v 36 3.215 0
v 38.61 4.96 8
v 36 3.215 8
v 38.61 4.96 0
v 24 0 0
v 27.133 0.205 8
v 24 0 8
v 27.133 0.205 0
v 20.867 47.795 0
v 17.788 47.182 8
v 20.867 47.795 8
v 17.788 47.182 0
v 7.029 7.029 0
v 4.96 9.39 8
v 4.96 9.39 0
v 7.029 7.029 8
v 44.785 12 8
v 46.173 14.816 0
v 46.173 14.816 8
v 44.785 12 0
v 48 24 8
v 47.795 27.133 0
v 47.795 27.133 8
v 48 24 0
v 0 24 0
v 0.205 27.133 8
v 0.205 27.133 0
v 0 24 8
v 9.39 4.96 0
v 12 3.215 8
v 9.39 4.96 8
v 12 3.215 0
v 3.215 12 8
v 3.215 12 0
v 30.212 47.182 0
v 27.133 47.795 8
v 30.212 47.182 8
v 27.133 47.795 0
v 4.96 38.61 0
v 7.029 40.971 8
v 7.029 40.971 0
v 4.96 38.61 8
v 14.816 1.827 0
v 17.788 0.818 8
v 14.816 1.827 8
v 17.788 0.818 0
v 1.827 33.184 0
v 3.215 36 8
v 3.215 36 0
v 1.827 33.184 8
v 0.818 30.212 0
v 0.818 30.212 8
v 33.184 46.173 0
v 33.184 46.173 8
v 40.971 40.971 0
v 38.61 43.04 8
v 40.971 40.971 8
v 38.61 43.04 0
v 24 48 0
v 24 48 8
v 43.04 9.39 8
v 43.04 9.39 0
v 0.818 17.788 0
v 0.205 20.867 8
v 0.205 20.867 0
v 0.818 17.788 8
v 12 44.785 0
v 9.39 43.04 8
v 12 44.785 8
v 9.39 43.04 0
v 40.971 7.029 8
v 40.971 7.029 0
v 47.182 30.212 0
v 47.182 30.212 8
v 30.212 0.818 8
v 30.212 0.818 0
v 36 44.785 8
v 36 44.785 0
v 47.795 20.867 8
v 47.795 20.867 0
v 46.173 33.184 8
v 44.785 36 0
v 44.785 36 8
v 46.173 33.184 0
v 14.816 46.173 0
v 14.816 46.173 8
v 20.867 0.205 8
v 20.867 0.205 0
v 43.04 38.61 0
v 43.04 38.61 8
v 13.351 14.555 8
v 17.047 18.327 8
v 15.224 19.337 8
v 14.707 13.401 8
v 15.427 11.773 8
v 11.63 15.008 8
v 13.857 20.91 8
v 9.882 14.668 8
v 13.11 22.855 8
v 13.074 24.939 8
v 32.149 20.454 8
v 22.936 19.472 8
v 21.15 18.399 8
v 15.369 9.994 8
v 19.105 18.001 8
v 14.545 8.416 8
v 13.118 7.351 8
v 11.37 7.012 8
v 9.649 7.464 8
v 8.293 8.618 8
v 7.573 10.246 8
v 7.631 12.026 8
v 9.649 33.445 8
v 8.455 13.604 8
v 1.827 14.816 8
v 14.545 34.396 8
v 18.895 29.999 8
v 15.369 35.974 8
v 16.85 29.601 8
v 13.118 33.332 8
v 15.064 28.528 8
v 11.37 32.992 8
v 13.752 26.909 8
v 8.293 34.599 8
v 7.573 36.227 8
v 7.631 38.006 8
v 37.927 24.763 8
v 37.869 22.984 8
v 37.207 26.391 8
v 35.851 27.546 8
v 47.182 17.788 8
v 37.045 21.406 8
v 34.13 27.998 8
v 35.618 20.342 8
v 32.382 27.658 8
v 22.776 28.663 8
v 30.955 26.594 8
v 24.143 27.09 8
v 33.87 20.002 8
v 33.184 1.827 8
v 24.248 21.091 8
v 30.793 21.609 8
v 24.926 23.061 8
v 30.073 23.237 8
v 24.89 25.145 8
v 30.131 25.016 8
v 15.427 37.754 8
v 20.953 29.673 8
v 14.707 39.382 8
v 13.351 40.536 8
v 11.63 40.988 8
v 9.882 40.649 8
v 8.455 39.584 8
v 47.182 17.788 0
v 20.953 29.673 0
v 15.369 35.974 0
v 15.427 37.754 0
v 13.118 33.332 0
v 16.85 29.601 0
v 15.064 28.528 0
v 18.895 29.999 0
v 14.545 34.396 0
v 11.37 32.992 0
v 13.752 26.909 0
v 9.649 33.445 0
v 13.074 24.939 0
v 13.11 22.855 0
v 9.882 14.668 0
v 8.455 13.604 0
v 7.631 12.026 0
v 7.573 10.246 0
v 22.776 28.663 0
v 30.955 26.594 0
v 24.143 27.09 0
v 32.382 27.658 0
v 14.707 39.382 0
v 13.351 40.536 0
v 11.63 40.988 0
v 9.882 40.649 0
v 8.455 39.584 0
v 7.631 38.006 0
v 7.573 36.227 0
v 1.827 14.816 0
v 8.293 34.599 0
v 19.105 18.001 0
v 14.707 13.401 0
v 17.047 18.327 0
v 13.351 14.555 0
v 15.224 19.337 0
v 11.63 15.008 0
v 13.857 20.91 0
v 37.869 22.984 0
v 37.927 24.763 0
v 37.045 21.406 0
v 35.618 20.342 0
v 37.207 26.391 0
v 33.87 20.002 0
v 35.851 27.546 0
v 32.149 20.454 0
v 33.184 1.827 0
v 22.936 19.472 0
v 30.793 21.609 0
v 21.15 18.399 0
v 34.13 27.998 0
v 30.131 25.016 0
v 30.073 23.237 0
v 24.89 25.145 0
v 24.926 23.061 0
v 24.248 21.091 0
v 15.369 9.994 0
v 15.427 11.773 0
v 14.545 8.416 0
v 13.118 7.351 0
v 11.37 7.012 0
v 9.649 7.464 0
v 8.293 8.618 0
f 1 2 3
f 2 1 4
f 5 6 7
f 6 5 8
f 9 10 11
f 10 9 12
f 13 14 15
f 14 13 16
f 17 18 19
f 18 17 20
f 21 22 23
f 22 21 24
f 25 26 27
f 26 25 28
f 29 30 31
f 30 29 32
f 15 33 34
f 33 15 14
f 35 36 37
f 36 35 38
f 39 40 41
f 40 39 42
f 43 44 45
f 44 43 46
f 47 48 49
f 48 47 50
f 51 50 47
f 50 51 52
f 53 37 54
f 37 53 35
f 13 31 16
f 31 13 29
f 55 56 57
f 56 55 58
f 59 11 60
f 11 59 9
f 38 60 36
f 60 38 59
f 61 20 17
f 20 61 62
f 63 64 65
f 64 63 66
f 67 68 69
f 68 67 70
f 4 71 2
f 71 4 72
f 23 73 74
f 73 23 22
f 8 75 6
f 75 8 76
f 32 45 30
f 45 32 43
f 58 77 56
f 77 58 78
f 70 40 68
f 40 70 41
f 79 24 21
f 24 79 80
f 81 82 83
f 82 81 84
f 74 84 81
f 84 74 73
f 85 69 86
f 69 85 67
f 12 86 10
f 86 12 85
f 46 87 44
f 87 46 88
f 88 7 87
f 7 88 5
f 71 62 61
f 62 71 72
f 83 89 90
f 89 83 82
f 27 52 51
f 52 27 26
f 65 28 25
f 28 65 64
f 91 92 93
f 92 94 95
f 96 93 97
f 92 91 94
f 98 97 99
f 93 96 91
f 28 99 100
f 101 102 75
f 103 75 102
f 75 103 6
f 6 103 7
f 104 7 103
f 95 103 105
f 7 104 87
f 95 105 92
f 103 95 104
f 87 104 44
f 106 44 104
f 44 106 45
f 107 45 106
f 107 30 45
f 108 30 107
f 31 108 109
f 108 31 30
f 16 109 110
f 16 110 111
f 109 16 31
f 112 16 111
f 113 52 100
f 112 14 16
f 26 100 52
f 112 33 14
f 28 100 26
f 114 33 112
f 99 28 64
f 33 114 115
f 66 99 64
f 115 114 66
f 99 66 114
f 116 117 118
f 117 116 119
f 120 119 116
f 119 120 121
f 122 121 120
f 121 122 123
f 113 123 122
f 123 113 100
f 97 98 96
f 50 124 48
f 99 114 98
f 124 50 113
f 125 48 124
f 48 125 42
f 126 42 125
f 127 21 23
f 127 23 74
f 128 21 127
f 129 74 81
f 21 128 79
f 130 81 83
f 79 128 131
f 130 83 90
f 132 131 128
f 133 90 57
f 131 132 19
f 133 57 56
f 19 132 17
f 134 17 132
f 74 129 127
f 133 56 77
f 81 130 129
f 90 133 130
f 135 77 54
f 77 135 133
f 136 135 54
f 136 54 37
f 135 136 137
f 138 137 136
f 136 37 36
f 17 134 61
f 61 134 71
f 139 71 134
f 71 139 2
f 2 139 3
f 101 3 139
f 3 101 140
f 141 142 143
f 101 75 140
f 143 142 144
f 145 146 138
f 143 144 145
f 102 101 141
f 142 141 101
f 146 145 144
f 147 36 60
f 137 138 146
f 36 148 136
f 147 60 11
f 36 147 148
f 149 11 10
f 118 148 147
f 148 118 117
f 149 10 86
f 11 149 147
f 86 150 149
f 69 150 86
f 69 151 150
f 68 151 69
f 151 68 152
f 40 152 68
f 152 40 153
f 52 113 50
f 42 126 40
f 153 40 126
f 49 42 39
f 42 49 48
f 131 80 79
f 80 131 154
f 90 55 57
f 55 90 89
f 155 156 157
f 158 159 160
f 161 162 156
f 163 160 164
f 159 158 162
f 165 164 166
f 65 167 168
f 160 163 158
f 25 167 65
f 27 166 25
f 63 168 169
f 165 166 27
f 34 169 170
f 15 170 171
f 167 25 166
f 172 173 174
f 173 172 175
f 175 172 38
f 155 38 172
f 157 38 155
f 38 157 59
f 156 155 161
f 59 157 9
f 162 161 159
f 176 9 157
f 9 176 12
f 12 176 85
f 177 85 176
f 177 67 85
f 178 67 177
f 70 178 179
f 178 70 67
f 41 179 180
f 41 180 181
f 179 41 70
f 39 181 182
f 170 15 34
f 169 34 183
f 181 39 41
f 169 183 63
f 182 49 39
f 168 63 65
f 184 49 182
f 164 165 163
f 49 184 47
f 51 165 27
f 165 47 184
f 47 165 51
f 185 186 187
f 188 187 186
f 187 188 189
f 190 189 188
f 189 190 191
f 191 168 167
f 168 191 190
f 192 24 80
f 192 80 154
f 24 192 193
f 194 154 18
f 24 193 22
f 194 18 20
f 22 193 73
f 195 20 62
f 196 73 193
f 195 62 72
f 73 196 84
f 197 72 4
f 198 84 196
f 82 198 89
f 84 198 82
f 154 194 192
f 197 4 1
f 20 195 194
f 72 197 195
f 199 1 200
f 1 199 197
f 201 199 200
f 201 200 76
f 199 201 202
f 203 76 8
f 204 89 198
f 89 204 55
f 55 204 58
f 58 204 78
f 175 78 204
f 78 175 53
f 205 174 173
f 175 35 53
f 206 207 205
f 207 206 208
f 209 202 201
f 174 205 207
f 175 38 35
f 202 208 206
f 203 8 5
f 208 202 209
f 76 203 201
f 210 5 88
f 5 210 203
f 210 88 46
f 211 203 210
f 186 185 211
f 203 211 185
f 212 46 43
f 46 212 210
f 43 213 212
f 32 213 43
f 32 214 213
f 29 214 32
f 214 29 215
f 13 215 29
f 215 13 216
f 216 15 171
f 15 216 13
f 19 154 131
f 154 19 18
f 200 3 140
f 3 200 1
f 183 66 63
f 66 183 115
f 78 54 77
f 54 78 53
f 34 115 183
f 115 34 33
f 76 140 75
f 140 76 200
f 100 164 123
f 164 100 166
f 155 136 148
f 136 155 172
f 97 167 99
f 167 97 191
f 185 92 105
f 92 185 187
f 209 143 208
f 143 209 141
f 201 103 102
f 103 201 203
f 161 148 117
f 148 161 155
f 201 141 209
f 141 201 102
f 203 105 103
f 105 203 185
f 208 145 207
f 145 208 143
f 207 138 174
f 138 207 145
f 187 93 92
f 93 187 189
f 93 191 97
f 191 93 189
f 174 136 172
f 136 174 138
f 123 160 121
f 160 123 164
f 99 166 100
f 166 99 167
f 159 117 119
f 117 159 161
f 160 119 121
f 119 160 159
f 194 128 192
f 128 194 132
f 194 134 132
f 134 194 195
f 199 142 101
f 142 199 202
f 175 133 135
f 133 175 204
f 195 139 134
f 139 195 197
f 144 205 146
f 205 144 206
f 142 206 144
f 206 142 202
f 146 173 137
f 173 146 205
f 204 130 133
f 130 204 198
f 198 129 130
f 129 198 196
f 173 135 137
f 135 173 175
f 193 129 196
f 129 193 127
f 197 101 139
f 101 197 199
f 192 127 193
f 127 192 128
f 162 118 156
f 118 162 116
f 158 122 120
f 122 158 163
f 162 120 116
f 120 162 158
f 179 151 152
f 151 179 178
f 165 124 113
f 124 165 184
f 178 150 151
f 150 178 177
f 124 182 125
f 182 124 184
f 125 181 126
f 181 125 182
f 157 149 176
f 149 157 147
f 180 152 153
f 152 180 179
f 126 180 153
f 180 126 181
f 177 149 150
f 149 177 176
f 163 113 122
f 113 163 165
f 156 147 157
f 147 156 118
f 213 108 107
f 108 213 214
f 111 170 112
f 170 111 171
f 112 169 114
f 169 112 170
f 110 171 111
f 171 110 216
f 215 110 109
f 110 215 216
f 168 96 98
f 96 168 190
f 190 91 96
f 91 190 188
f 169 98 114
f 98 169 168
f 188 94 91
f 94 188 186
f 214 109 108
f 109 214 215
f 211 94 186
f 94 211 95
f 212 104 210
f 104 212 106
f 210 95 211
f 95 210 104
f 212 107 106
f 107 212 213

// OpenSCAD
$fn = 32;

// ----------------------------------------------------------------------
// Cam plate: eccentric cam, base R24
// ----------------------------------------------------------------------

// --- parameters (mm) ---
base_r = 24;              // base circle radius
lobe_h = 14;              // cam lobe rise
bore_r = 6;               // shaft bore radius
plate_t = 8;              // plate thickness, Z (extrusion height)
ecc = 5;                  // disc eccentricity
ring_r = 15;              // lightening ring radius
bolt_r = 4;               // lightening hole radius
fit_tol = 0.02;           // declared fit tolerance (prompt contract)
free_tol = 0.2;           // declared free tolerance (prompt contract)

profile = [[48, 24], [47.795, 27.133], [47.182, 30.212], [46.173, 33.184], [44.785, 36], [43.04, 38.61], [40.971, 40.971], [38.61, 43.04], [36, 44.785], [33.184, 46.173], [30.212, 47.182], [27.133, 47.795], [24, 48], [20.867, 47.795], [17.788, 47.182], [14.816, 46.173], [12, 44.785], [9.39, 43.04], [7.029, 40.971], [4.96, 38.61], [3.215, 36], [1.827, 33.184], [0.818, 30.212], [0.205, 27.133], [0, 24], [0.205, 20.867], [0.818, 17.788], [1.827, 14.816], [3.215, 12], [4.96, 9.39], [7.029, 7.029], [9.39, 4.96], [12, 3.215], [14.816, 1.827], [17.788, 0.818], [20.867, 0.205], [24, 0], [27.133, 0.205], [30.212, 0.818], [33.184, 1.827], [36, 3.215], [38.61, 4.96], [40.971, 7.029], [43.04, 9.39], [44.785, 12], [46.173, 14.816], [47.182, 17.788], [47.795, 20.867]];  // primary outline, 48 points, counter clockwise
void_1 = [[24.89, 25.145], [24.143, 27.09], [22.776, 28.663], [20.953, 29.673], [18.895, 29.999], [16.85, 29.601], [15.064, 28.528], [13.752, 26.909], [13.074, 24.939], [13.11, 22.855], [13.857, 20.91], [15.224, 19.337], [17.047, 18.327], [19.105, 18.001], [21.15, 18.399], [22.936, 19.472], [24.248, 21.091], [24.926, 23.061]];  // shaft bore, 18 points
void_2 = [[37.927, 24.763], [37.207, 26.391], [35.851, 27.546], [34.13, 27.998], [32.382, 27.658], [30.955, 26.594], [30.131, 25.016], [30.073, 23.237], [30.793, 21.609], [32.149, 20.454], [33.87, 20.002], [35.618, 20.342], [37.045, 21.406], [37.869, 22.984]];  // lightening hole 1, 14 points
void_3 = [[15.427, 37.754], [14.707, 39.382], [13.351, 40.536], [11.63, 40.988], [9.882, 40.649], [8.455, 39.584], [7.631, 38.006], [7.573, 36.227], [8.293, 34.599], [9.649, 33.445], [11.37, 32.992], [13.118, 33.332], [14.545, 34.396], [15.369, 35.974]];  // lightening hole 2, 14 points
void_4 = [[15.427, 11.773], [14.707, 13.401], [13.351, 14.555], [11.63, 15.008], [9.882, 14.668], [8.455, 13.604], [7.631, 12.026], [7.573, 10.246], [8.293, 8.618], [9.649, 7.464], [11.37, 7.012], [13.118, 7.351], [14.545, 8.416], [15.369, 9.994]];  // lightening hole 3, 14 points

// --- the one profile operation ---
difference() {
  linear_extrude(height = plate_t) polygon(points = profile);
  translate([0, 0, -1])
    linear_extrude(height = plate_t + 2) polygon(points = void_1);
  translate([0, 0, -1])
    linear_extrude(height = plate_t + 2) polygon(points = void_2);
  translate([0, 0, -1])
    linear_extrude(height = plate_t + 2) polygon(points = void_3);
  translate([0, 0, -1])
    linear_extrude(height = plate_t + 2) polygon(points = void_4);
}
